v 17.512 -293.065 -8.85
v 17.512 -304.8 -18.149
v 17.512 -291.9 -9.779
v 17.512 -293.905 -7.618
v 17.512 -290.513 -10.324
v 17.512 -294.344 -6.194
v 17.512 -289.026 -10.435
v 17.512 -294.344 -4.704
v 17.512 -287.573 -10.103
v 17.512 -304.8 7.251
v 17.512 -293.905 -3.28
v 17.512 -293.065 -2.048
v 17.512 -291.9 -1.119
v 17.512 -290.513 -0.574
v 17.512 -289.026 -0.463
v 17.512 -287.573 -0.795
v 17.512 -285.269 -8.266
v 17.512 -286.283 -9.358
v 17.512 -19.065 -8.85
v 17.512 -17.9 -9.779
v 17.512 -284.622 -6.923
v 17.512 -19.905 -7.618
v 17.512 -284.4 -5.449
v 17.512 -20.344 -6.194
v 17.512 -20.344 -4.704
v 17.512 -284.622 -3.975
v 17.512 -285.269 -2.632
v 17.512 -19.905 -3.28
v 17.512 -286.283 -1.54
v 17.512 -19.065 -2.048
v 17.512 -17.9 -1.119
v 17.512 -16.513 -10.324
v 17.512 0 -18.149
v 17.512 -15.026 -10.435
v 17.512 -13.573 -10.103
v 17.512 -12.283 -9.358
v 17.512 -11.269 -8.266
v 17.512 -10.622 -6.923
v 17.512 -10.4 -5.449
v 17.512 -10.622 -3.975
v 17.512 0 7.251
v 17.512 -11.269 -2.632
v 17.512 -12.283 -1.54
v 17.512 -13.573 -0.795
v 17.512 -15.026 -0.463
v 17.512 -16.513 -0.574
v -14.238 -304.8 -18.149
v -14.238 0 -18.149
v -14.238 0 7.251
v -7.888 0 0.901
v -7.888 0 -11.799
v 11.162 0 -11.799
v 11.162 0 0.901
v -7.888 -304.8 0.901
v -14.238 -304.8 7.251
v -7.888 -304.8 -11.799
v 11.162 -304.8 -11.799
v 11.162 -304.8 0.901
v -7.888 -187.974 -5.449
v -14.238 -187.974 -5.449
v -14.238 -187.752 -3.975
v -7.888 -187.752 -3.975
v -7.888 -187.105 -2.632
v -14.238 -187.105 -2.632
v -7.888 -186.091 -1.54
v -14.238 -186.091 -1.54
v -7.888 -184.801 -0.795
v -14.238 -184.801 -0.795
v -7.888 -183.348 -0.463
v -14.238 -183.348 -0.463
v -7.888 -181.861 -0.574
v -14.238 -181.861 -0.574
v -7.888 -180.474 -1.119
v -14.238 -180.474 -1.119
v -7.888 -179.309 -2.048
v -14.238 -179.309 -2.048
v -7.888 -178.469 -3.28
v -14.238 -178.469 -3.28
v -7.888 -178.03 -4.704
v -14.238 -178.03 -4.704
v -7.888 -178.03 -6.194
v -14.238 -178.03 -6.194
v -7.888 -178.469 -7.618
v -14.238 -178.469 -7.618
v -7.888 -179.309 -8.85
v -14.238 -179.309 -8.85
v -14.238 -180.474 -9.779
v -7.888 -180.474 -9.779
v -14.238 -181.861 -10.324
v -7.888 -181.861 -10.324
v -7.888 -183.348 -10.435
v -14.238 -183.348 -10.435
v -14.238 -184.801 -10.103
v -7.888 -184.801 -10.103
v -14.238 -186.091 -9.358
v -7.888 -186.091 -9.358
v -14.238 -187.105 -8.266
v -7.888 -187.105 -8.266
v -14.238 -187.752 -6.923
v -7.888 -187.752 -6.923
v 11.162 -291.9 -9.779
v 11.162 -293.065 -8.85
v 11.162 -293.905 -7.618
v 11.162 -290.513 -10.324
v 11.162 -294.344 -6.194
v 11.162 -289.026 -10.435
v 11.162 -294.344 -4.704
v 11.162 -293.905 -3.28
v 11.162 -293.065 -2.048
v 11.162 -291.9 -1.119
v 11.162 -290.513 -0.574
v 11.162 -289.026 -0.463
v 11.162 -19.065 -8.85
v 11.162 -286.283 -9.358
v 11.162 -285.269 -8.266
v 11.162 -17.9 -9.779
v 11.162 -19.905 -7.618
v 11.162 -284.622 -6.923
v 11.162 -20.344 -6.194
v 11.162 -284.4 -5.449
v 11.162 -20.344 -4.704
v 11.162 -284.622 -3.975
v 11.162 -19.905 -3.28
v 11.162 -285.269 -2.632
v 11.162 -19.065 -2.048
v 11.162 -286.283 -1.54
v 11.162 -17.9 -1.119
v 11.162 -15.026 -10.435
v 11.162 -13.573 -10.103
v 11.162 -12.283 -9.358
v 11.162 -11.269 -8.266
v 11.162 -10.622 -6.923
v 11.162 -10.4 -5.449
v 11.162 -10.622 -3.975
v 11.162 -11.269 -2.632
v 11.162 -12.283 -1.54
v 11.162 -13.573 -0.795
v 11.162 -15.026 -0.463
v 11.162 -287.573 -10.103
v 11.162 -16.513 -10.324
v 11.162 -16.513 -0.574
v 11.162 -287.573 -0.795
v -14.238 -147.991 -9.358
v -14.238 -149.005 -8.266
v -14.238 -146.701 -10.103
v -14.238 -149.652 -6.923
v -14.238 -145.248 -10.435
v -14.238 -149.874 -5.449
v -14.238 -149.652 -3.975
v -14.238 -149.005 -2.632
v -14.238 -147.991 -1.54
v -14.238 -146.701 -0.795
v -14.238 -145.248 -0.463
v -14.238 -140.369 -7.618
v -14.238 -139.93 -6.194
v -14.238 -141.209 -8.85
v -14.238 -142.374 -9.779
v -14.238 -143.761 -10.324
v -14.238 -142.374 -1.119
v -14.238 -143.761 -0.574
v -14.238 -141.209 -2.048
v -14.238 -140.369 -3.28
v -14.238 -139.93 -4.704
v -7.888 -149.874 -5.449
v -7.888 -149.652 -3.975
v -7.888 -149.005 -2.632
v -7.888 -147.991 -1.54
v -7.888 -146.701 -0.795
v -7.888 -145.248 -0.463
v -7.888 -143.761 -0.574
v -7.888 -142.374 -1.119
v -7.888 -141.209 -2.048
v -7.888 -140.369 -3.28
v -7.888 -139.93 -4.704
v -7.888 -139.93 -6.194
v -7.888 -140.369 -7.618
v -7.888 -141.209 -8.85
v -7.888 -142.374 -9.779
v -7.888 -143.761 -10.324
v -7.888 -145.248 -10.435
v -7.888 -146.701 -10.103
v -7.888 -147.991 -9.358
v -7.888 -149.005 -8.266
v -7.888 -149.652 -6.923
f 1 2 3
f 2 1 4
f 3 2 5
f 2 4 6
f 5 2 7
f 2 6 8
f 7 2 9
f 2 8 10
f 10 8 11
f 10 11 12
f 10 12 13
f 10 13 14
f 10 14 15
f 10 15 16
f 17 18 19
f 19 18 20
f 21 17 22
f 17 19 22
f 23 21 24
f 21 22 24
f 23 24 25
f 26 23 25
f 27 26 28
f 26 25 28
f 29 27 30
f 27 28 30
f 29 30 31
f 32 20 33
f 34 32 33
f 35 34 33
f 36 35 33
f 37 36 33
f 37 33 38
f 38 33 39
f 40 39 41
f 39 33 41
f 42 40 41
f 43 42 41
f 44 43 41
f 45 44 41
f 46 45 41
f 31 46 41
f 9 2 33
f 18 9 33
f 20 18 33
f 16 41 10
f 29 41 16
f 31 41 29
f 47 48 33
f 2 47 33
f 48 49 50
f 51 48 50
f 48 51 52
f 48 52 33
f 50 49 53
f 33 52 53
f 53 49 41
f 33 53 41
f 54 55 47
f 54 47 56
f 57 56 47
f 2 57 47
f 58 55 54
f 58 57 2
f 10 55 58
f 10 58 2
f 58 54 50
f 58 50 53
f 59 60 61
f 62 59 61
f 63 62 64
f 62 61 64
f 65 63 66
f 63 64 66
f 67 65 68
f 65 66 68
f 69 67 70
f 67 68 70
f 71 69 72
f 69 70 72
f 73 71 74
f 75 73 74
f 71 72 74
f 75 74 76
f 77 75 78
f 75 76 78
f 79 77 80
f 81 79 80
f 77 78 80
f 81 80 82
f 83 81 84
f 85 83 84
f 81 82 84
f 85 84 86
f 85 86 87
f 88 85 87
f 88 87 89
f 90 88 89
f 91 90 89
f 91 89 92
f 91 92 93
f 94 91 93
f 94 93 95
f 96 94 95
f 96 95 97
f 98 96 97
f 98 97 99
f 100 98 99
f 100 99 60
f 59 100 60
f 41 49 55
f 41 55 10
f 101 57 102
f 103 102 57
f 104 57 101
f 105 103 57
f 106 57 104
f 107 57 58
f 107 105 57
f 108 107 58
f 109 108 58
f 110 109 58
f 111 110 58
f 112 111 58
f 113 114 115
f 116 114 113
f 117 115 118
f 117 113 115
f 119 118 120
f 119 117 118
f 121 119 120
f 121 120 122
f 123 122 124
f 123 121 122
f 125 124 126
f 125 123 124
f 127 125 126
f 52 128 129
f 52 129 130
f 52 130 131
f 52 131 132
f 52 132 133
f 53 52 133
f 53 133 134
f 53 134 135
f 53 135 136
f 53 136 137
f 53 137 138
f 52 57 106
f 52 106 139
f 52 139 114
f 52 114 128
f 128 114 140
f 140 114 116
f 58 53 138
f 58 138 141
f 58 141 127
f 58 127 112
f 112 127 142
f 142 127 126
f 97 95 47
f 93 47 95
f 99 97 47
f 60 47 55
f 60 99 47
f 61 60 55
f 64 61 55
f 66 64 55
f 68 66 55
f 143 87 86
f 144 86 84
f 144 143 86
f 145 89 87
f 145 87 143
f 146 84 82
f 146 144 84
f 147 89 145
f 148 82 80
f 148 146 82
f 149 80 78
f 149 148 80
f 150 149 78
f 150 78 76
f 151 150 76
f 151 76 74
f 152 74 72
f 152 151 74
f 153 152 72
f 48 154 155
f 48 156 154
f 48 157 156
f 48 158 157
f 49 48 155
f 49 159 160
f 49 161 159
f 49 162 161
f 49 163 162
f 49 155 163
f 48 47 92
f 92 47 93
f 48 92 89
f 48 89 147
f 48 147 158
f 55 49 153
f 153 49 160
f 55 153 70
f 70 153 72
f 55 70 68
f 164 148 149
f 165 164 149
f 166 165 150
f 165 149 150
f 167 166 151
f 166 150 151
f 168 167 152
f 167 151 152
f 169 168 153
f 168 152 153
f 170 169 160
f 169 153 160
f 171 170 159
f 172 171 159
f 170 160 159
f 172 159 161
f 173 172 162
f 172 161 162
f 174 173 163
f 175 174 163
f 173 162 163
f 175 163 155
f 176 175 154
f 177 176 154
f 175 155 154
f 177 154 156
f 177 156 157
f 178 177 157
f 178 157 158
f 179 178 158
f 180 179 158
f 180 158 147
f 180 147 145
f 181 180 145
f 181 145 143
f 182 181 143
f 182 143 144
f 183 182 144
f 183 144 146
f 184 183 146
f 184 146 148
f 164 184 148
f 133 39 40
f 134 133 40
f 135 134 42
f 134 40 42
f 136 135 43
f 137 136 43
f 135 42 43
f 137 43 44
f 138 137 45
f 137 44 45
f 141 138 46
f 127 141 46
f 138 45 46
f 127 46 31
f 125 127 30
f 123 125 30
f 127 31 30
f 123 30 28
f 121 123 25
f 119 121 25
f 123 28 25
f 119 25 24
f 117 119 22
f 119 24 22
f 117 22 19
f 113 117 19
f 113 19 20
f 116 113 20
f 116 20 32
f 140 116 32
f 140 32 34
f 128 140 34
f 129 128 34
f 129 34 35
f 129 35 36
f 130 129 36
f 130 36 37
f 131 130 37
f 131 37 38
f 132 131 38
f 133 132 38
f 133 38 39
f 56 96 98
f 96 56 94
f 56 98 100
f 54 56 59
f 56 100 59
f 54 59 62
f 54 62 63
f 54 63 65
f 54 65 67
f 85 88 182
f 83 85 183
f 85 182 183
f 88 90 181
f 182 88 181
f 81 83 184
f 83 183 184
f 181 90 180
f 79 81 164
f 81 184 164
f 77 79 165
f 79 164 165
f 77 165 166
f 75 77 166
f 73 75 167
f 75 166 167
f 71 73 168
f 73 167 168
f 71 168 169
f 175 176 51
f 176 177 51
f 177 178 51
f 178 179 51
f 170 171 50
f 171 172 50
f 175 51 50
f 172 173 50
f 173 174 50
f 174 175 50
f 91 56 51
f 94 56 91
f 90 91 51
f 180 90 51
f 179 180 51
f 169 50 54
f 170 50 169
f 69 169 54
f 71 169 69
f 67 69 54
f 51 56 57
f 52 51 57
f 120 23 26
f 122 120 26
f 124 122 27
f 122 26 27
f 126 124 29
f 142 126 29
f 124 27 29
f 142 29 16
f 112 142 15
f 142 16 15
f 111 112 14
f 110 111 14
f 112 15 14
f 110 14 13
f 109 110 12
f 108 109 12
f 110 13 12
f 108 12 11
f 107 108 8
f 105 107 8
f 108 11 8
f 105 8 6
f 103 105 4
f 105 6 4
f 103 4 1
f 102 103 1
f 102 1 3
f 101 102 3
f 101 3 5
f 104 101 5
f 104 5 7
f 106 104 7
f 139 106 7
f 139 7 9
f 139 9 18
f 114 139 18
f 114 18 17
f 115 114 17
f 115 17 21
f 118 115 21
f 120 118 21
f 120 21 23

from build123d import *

# Parameters (mm, degrees)
F0_W     = 31.75
F0_H     = 25.4
F0_W_2   = 19.05
F0_H_2   = 12.7
F1_DEPTH = 304.8
F2_R     = 5
F3_DEPTH = 25.4
F4_R     = 5
F5_DEPTH = 12.7


with BuildPart() as f1:
    # F0 (on Front) → F1 (new body)
    with BuildSketch(Plane.XZ):
        with Locations((1.637192, -5.449059)):
            Rectangle(F0_W, F0_H)
        with Locations((1.637192, -5.449059)):
            Rectangle(F0_W_2, F0_H_2, mode=Mode.SUBTRACT)
    extrude(amount=F1_DEPTH)

    # F2 (on face) → F3 (cut)
    with BuildSketch(Plane.YZ.offset(17.512192)):
        with Locations((-15.4, -5.449059)):
            Circle(F2_R)
        with Locations((-289.4, -5.449059)):
            Circle(F2_R)
    extrude(amount=-F3_DEPTH, mode=Mode.SUBTRACT)

    # F4 (on face) → F5 (cut)
    with BuildSketch(Plane(origin=(-14.237808, 0, 0), x_dir=(0, -1, 0), z_dir=(-1, 0, 0))):
        with Locations((144.87398, -5.449059)):
            Circle(F4_R)
        with Locations((182.974, -5.449059)):
            Circle(F4_R)
    extrude(amount=-F5_DEPTH, mode=Mode.SUBTRACT)


solid = f1.part
